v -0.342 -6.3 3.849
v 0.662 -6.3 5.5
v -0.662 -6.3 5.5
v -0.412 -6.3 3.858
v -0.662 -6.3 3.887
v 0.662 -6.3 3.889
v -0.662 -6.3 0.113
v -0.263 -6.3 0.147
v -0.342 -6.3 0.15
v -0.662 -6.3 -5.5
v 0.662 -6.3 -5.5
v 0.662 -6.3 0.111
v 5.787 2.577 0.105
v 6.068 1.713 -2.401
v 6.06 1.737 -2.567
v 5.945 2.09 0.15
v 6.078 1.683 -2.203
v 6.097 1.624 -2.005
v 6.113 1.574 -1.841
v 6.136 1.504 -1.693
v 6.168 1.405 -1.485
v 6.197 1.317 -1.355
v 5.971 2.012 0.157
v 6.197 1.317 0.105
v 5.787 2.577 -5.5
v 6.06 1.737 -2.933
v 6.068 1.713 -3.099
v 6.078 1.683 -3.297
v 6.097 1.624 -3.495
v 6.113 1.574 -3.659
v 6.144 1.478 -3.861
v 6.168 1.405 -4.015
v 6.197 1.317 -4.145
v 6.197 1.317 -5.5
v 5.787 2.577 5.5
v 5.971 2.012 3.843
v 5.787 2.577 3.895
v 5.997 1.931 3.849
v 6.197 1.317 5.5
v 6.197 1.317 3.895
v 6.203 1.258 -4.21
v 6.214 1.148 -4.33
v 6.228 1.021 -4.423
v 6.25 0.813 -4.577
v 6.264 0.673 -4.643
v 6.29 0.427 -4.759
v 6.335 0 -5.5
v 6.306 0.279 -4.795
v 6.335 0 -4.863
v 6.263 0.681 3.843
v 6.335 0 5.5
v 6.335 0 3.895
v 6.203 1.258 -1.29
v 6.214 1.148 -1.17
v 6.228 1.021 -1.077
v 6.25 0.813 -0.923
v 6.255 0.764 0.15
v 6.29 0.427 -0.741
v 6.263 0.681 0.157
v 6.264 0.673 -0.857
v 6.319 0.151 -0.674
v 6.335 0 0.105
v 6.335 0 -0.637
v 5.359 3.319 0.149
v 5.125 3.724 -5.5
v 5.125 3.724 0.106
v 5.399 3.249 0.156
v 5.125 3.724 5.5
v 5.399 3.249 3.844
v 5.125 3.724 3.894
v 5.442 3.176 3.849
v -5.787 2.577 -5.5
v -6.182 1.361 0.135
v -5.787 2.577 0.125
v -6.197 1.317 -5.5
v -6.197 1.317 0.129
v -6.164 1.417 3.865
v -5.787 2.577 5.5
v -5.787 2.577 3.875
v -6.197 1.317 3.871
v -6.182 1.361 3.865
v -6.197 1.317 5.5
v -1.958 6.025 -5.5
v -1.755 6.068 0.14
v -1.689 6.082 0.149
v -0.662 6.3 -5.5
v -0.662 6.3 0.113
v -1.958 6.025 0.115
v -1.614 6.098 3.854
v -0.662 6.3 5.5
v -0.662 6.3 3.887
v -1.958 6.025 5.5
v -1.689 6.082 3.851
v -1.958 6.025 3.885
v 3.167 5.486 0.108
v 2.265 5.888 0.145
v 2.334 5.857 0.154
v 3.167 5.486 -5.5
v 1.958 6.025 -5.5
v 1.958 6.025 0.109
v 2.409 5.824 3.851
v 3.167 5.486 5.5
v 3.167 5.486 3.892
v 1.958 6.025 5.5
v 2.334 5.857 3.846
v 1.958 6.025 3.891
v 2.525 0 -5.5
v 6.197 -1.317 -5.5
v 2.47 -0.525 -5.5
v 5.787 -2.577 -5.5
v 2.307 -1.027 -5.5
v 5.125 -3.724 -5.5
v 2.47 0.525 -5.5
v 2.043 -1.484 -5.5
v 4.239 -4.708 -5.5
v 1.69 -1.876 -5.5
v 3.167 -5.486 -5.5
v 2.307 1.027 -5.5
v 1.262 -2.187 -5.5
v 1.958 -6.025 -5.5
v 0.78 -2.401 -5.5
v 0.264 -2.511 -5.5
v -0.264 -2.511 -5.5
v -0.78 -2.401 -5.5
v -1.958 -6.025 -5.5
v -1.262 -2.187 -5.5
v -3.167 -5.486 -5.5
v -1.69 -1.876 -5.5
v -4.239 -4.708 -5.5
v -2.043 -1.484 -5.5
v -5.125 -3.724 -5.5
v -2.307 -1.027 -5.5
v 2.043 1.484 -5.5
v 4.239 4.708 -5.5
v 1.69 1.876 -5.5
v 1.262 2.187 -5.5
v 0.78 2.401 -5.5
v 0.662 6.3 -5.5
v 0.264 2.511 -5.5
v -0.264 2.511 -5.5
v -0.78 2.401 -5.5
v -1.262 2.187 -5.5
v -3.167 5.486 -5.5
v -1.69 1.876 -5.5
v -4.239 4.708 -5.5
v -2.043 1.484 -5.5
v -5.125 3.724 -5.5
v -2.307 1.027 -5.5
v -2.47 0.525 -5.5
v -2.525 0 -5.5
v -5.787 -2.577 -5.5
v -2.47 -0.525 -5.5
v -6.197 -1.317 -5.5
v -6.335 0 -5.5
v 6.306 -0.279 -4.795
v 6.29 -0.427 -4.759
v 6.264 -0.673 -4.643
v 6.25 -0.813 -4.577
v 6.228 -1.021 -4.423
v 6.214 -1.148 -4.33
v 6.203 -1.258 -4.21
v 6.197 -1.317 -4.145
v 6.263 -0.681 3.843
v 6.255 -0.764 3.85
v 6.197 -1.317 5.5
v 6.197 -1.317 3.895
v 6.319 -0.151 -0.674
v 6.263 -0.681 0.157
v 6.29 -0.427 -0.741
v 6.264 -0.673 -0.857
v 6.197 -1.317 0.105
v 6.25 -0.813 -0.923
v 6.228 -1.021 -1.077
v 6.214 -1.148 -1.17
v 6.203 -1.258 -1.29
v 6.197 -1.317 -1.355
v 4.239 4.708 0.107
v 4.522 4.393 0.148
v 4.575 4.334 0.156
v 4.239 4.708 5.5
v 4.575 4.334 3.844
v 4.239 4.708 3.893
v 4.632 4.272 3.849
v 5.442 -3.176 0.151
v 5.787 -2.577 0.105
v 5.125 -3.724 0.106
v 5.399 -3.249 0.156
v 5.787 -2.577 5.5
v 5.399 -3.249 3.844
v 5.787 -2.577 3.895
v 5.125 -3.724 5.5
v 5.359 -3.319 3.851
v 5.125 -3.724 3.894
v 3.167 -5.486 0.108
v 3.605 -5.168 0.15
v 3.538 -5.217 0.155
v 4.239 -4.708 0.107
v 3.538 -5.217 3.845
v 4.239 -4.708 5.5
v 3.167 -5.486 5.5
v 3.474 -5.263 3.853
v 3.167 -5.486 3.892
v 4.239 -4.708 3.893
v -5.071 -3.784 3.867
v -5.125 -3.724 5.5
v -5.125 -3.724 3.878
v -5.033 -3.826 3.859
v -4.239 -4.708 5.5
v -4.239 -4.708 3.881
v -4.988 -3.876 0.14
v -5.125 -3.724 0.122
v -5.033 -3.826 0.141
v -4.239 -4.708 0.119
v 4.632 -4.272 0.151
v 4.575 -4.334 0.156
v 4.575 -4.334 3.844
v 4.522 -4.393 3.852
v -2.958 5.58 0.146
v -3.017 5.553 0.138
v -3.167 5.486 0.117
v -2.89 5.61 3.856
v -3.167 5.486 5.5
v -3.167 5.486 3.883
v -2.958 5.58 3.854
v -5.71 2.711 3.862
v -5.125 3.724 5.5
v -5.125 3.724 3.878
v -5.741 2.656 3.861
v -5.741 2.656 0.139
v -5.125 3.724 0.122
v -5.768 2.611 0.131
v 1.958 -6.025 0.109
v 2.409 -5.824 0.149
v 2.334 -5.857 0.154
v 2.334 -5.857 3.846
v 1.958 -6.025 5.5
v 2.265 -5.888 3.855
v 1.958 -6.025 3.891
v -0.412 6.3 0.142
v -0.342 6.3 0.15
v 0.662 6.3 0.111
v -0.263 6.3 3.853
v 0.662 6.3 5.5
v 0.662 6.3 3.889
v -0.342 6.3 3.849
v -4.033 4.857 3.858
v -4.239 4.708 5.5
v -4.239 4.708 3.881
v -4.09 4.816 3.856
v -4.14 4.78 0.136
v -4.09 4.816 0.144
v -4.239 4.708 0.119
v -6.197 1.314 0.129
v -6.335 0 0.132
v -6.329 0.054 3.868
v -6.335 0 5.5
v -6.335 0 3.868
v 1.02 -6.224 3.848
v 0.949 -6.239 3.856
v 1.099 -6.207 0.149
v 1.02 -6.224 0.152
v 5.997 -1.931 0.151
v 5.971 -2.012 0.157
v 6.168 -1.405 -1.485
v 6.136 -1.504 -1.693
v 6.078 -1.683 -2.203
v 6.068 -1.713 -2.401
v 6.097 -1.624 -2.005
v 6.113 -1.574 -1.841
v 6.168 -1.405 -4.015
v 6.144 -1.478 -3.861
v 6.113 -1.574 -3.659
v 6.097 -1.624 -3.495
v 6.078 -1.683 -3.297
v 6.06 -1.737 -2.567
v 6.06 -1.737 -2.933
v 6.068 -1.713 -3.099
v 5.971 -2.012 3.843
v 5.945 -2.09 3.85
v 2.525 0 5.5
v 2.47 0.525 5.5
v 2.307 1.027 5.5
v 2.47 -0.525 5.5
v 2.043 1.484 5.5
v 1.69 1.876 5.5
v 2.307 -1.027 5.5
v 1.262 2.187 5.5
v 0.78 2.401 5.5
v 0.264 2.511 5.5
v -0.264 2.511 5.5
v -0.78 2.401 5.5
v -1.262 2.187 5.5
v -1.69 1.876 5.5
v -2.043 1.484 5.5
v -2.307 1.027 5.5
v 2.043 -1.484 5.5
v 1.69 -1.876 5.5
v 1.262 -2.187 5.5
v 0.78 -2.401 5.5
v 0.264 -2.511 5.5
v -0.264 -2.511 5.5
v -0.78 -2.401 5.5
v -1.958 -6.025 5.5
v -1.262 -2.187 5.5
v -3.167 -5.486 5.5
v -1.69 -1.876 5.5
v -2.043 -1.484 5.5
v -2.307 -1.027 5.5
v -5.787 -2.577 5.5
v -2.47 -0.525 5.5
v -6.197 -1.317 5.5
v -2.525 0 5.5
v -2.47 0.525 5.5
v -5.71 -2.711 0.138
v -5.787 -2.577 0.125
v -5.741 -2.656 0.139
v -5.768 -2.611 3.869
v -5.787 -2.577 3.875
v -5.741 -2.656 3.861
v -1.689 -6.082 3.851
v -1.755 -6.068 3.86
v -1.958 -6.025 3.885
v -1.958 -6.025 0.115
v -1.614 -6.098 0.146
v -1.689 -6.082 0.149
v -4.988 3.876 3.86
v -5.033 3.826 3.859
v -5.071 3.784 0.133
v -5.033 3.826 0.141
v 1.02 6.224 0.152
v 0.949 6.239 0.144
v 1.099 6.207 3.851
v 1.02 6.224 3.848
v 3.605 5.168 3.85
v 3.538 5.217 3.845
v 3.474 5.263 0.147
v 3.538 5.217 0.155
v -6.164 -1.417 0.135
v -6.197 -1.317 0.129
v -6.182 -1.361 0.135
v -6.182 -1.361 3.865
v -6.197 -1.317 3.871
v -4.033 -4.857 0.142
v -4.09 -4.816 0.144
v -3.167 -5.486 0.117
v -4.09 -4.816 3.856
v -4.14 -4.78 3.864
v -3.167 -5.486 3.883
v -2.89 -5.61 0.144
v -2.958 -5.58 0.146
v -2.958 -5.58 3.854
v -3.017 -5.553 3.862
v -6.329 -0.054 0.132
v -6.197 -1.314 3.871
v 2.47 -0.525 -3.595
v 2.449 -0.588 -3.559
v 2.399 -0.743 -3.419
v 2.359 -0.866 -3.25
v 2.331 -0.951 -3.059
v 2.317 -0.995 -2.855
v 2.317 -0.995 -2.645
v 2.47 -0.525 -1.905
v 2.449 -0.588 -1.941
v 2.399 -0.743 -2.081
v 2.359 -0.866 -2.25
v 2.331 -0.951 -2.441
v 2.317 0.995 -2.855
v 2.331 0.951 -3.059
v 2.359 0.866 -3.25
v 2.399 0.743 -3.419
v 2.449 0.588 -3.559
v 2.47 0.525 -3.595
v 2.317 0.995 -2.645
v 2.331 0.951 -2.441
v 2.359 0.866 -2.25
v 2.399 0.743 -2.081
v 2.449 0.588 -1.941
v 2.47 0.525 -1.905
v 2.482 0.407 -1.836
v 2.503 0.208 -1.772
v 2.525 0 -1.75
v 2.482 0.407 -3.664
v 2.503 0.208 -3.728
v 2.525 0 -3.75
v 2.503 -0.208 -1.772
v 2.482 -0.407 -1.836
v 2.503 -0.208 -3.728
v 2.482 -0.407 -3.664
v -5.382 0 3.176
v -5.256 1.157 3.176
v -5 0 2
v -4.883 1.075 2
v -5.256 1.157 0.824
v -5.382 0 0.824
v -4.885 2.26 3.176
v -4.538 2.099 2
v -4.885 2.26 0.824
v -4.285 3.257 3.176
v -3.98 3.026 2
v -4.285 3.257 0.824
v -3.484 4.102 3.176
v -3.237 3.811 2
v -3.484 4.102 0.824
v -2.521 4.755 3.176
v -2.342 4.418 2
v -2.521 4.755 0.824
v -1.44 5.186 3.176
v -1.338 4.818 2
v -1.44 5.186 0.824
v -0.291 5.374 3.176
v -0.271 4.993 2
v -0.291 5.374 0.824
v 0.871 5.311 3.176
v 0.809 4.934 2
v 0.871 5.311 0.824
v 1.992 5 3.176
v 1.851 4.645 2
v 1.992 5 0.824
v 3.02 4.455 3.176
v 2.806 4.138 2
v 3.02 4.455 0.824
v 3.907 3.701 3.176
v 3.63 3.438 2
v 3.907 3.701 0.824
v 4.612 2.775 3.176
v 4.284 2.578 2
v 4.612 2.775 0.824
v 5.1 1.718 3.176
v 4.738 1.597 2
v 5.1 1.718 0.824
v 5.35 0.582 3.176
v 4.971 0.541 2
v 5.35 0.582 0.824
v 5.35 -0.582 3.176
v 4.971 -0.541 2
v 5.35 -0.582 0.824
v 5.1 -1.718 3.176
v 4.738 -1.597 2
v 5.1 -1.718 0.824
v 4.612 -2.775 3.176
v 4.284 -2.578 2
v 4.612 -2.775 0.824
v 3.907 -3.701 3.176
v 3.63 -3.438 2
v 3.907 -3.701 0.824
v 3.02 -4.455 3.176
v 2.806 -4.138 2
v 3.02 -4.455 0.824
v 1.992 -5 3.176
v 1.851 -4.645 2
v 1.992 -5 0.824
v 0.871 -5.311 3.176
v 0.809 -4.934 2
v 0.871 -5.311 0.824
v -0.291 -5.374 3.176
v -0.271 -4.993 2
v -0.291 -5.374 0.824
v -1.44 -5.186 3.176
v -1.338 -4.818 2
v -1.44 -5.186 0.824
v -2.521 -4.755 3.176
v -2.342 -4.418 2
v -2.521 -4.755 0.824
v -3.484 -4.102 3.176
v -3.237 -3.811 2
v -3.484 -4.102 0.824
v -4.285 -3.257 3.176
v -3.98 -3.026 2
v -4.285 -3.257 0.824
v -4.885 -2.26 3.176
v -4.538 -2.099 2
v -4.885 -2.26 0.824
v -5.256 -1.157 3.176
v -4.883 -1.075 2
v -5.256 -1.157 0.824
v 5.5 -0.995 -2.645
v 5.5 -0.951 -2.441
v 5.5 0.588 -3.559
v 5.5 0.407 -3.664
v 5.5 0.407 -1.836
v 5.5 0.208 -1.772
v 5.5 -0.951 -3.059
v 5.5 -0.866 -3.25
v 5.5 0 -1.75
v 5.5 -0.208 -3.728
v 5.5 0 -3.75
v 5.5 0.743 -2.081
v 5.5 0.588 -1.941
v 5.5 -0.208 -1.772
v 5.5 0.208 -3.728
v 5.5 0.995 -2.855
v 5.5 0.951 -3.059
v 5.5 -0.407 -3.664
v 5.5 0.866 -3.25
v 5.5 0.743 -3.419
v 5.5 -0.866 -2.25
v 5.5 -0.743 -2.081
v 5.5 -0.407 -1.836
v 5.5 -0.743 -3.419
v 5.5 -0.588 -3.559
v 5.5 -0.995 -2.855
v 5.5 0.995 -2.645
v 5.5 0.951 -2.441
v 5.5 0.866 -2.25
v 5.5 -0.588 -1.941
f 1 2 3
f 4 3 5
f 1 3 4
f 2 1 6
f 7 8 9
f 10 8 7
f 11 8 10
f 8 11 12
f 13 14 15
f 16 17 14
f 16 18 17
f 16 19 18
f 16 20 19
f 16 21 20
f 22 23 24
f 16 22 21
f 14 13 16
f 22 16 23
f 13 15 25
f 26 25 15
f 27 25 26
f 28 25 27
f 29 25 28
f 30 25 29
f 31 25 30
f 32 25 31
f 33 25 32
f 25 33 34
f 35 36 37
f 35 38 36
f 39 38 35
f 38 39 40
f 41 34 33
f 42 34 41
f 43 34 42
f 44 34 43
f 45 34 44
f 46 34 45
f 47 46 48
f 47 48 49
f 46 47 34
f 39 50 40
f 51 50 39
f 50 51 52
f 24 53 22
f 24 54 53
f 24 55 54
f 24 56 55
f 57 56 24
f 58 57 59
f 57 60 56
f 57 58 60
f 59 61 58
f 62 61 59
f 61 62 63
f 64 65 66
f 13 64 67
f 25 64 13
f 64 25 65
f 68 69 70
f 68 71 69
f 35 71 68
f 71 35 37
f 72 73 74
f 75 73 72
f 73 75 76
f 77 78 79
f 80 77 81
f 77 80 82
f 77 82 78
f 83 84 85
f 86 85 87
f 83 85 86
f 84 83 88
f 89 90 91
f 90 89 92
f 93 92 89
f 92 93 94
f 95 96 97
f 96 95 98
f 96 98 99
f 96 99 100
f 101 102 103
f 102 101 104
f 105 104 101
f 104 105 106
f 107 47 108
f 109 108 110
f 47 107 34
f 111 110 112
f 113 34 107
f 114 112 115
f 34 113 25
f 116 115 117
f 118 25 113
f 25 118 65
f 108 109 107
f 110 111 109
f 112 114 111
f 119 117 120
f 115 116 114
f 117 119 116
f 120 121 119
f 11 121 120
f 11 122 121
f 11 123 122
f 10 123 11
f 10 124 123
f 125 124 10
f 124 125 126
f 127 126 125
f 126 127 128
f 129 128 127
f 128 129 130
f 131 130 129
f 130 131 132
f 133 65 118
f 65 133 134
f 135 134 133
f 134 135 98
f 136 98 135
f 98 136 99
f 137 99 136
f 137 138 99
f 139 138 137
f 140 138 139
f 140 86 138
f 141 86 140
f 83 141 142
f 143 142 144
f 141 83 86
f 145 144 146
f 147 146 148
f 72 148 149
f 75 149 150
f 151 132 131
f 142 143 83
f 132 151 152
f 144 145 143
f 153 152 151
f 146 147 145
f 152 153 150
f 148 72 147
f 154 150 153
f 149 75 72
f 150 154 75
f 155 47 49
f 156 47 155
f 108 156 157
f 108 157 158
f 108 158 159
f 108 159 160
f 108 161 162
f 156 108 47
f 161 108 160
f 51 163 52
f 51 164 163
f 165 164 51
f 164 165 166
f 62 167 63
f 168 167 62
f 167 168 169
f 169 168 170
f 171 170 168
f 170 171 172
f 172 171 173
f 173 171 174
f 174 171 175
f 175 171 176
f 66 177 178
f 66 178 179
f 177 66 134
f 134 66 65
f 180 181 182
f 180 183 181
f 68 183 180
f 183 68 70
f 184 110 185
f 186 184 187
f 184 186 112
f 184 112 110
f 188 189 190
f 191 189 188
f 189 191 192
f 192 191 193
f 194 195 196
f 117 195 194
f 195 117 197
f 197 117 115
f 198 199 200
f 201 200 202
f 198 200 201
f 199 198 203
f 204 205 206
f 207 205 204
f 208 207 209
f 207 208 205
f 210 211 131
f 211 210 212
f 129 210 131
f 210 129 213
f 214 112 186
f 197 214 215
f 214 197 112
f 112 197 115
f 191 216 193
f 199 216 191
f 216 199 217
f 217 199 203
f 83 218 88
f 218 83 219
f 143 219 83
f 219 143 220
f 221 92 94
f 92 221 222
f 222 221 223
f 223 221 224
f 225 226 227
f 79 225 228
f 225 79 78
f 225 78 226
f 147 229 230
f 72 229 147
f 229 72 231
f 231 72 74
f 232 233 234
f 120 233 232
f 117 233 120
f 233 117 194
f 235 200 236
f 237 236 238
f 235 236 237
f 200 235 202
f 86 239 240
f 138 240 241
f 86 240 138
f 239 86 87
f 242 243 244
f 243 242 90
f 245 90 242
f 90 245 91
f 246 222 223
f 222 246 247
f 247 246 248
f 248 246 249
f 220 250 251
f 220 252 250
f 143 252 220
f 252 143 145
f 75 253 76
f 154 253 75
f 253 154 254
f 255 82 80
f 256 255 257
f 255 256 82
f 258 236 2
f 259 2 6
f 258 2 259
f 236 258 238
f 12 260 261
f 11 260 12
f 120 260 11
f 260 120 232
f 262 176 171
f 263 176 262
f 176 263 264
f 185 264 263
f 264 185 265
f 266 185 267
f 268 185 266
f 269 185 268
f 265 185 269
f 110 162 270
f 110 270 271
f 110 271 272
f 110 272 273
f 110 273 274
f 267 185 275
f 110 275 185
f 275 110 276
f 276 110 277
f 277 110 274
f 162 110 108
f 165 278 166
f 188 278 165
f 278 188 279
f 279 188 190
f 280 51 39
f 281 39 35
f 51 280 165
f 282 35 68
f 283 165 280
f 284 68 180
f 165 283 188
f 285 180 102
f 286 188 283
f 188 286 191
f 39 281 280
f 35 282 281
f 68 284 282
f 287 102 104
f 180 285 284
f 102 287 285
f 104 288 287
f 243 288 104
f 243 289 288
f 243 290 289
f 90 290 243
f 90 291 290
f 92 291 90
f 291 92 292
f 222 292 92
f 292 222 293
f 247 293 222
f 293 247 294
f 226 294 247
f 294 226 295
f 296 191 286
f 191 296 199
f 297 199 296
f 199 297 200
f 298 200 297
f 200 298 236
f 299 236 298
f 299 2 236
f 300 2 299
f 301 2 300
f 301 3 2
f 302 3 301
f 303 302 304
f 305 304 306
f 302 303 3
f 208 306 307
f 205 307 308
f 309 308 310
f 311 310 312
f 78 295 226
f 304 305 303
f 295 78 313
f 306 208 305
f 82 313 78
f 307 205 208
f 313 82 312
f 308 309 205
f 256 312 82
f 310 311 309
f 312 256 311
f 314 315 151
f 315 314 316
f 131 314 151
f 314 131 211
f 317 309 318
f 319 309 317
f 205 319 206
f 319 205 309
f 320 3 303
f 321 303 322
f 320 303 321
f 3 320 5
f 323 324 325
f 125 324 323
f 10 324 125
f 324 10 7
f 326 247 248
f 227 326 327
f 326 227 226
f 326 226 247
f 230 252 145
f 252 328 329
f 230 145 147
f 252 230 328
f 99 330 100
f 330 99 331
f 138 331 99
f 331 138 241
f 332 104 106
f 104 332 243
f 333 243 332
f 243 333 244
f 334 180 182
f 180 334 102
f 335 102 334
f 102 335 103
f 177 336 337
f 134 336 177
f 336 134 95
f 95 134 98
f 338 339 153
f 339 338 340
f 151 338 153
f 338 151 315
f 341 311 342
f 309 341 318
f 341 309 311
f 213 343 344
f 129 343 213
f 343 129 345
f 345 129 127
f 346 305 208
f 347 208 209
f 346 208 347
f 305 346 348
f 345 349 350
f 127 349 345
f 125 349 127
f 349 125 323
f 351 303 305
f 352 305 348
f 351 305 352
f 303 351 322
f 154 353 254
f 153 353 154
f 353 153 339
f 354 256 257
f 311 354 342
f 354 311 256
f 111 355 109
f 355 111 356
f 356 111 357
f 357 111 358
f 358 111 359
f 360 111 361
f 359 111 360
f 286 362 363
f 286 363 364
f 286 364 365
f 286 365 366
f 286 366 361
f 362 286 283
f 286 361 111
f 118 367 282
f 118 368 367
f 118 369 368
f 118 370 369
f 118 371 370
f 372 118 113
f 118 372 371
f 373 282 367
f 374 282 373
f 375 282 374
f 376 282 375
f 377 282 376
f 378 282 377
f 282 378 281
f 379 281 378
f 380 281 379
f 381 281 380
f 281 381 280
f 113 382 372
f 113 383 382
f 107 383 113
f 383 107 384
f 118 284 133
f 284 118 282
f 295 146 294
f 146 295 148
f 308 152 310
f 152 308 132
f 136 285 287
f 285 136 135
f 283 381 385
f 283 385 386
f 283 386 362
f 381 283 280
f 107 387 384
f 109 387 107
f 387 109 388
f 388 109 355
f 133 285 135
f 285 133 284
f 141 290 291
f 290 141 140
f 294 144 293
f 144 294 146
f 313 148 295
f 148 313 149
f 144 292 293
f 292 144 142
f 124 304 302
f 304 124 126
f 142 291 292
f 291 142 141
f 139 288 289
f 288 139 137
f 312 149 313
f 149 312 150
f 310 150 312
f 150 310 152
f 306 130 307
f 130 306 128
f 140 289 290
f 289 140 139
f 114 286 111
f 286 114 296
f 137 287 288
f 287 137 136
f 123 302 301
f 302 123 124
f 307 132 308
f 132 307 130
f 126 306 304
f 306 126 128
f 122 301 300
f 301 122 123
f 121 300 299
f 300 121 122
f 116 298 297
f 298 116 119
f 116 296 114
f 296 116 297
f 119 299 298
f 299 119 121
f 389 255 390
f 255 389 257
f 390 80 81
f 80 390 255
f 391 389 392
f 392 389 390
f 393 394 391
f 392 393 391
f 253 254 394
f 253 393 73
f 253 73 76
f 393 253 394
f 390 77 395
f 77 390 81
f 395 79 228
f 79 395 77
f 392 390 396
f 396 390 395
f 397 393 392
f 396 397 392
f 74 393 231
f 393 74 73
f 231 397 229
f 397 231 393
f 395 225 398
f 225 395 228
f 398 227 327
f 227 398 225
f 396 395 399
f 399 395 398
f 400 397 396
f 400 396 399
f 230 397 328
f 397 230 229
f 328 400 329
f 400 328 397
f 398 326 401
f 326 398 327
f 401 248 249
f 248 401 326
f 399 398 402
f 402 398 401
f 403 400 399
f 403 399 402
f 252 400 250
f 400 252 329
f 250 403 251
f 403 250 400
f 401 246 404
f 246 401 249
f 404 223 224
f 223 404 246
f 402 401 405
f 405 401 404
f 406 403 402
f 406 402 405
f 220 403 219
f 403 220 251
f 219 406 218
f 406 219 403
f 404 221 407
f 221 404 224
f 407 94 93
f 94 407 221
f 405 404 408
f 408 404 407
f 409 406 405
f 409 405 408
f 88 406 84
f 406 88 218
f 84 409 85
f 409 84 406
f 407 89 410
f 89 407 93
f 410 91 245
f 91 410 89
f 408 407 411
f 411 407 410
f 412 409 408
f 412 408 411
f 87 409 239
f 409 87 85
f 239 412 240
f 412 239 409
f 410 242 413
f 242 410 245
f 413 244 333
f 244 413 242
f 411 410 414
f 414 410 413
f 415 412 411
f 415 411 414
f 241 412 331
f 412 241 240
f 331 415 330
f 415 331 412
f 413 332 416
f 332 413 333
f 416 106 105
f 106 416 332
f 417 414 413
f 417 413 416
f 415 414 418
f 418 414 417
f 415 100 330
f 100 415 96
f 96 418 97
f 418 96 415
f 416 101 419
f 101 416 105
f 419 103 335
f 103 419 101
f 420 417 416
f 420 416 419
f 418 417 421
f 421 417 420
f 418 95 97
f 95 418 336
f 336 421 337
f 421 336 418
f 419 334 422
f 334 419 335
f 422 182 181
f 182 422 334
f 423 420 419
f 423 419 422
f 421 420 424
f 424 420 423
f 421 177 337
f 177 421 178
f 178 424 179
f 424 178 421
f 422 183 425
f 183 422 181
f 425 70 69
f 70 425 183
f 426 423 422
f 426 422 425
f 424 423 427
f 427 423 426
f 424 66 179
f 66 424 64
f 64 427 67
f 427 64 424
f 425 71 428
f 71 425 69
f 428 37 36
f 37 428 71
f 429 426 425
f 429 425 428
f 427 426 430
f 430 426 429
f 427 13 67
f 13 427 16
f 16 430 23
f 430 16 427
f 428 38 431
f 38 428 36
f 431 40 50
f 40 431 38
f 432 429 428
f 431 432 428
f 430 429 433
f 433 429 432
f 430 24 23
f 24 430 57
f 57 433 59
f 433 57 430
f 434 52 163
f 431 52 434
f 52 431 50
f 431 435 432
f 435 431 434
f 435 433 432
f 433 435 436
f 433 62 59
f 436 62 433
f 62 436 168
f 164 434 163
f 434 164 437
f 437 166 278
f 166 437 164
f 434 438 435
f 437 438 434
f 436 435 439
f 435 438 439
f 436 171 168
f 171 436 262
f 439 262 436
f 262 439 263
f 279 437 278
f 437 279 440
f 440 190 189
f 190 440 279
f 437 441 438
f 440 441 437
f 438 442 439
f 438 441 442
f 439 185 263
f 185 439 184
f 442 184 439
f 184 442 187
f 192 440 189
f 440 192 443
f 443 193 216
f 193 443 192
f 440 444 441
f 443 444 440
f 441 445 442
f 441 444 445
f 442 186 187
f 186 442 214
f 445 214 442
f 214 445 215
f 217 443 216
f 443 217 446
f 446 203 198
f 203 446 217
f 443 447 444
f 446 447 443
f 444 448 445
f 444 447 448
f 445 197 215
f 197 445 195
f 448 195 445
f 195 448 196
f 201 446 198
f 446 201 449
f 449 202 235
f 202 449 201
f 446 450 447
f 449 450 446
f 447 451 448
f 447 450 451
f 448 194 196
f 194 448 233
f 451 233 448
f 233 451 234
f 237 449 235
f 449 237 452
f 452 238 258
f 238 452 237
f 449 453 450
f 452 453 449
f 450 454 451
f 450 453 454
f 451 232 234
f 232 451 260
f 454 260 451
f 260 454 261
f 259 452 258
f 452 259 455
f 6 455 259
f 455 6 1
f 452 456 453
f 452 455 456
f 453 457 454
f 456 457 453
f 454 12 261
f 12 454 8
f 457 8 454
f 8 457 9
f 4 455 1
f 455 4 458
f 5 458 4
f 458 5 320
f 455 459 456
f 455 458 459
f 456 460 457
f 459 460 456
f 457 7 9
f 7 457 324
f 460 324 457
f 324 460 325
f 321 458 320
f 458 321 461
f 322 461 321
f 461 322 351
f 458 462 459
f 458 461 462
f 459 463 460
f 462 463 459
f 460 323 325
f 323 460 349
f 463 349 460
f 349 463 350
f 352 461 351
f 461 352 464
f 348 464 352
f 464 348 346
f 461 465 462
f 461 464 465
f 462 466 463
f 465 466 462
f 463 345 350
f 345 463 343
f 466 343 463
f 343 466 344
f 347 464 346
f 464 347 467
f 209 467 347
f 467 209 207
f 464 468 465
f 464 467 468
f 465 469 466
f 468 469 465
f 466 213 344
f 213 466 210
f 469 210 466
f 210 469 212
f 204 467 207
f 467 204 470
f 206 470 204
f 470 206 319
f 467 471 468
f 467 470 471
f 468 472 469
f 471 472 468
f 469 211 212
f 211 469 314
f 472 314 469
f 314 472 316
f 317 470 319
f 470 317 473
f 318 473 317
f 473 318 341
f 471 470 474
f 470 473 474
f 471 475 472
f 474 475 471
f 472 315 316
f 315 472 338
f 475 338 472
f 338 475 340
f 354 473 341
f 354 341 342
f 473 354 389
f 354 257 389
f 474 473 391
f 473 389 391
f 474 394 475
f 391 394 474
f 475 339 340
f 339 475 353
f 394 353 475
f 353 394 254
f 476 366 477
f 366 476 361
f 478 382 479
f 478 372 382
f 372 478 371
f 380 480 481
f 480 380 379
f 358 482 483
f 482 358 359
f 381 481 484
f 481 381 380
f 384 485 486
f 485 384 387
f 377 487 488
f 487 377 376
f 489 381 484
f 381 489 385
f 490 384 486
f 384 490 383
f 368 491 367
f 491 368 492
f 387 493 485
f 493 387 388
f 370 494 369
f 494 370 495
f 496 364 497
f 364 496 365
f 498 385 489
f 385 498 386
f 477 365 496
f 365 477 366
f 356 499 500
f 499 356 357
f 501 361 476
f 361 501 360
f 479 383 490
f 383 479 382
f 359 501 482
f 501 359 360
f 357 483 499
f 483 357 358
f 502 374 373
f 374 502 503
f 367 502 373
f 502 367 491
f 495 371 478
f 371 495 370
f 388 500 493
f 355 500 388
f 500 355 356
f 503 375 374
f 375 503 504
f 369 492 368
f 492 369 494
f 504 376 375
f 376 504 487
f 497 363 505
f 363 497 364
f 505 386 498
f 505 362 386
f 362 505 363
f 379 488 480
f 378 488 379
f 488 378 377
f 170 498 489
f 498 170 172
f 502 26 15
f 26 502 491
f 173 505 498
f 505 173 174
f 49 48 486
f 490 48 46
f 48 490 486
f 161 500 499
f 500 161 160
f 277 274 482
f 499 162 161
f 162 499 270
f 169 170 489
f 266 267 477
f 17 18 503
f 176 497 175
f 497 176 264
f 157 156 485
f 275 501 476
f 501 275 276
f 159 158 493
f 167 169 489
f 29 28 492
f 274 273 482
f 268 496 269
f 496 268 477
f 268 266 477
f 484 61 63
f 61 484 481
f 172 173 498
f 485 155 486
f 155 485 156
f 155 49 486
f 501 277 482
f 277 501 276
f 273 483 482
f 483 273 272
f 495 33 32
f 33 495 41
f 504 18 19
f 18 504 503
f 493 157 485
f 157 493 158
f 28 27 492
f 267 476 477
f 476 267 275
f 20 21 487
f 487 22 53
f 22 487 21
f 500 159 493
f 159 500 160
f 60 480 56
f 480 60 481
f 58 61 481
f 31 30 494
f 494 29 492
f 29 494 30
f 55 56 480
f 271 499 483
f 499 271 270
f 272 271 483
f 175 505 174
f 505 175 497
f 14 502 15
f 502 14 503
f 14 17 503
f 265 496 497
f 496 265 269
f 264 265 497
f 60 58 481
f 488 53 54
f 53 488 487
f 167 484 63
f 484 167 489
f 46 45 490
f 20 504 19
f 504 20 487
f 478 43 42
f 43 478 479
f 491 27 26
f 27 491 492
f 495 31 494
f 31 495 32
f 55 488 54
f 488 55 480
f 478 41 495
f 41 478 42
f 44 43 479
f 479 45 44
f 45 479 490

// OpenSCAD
// TrinityLabs MK7 Hobbed Pulley

module hobb() {
	rotate_extrude(convexity=10) translate([7,0,0]) circle(r=2, $fn=10);
}

module mk7() {
	difference() {
		cylinder(r=12.67/2, h=11, center=true, $fn=30);
		cylinder(r=5.05/2, h=12, center=true, $fn=30);
		translate([0,0,2]) hobb();
		translate([4,0,-2.75]) rotate([0,90,0]) 
			cylinder(r=1, h=6, center=true, $fn=30);
		translate([7,0,-2.75]) rotate([0,90,0]) 
			cylinder(r1=1, r2=5, h=3, center=true, $fn=30);
	}
}

mk7();
